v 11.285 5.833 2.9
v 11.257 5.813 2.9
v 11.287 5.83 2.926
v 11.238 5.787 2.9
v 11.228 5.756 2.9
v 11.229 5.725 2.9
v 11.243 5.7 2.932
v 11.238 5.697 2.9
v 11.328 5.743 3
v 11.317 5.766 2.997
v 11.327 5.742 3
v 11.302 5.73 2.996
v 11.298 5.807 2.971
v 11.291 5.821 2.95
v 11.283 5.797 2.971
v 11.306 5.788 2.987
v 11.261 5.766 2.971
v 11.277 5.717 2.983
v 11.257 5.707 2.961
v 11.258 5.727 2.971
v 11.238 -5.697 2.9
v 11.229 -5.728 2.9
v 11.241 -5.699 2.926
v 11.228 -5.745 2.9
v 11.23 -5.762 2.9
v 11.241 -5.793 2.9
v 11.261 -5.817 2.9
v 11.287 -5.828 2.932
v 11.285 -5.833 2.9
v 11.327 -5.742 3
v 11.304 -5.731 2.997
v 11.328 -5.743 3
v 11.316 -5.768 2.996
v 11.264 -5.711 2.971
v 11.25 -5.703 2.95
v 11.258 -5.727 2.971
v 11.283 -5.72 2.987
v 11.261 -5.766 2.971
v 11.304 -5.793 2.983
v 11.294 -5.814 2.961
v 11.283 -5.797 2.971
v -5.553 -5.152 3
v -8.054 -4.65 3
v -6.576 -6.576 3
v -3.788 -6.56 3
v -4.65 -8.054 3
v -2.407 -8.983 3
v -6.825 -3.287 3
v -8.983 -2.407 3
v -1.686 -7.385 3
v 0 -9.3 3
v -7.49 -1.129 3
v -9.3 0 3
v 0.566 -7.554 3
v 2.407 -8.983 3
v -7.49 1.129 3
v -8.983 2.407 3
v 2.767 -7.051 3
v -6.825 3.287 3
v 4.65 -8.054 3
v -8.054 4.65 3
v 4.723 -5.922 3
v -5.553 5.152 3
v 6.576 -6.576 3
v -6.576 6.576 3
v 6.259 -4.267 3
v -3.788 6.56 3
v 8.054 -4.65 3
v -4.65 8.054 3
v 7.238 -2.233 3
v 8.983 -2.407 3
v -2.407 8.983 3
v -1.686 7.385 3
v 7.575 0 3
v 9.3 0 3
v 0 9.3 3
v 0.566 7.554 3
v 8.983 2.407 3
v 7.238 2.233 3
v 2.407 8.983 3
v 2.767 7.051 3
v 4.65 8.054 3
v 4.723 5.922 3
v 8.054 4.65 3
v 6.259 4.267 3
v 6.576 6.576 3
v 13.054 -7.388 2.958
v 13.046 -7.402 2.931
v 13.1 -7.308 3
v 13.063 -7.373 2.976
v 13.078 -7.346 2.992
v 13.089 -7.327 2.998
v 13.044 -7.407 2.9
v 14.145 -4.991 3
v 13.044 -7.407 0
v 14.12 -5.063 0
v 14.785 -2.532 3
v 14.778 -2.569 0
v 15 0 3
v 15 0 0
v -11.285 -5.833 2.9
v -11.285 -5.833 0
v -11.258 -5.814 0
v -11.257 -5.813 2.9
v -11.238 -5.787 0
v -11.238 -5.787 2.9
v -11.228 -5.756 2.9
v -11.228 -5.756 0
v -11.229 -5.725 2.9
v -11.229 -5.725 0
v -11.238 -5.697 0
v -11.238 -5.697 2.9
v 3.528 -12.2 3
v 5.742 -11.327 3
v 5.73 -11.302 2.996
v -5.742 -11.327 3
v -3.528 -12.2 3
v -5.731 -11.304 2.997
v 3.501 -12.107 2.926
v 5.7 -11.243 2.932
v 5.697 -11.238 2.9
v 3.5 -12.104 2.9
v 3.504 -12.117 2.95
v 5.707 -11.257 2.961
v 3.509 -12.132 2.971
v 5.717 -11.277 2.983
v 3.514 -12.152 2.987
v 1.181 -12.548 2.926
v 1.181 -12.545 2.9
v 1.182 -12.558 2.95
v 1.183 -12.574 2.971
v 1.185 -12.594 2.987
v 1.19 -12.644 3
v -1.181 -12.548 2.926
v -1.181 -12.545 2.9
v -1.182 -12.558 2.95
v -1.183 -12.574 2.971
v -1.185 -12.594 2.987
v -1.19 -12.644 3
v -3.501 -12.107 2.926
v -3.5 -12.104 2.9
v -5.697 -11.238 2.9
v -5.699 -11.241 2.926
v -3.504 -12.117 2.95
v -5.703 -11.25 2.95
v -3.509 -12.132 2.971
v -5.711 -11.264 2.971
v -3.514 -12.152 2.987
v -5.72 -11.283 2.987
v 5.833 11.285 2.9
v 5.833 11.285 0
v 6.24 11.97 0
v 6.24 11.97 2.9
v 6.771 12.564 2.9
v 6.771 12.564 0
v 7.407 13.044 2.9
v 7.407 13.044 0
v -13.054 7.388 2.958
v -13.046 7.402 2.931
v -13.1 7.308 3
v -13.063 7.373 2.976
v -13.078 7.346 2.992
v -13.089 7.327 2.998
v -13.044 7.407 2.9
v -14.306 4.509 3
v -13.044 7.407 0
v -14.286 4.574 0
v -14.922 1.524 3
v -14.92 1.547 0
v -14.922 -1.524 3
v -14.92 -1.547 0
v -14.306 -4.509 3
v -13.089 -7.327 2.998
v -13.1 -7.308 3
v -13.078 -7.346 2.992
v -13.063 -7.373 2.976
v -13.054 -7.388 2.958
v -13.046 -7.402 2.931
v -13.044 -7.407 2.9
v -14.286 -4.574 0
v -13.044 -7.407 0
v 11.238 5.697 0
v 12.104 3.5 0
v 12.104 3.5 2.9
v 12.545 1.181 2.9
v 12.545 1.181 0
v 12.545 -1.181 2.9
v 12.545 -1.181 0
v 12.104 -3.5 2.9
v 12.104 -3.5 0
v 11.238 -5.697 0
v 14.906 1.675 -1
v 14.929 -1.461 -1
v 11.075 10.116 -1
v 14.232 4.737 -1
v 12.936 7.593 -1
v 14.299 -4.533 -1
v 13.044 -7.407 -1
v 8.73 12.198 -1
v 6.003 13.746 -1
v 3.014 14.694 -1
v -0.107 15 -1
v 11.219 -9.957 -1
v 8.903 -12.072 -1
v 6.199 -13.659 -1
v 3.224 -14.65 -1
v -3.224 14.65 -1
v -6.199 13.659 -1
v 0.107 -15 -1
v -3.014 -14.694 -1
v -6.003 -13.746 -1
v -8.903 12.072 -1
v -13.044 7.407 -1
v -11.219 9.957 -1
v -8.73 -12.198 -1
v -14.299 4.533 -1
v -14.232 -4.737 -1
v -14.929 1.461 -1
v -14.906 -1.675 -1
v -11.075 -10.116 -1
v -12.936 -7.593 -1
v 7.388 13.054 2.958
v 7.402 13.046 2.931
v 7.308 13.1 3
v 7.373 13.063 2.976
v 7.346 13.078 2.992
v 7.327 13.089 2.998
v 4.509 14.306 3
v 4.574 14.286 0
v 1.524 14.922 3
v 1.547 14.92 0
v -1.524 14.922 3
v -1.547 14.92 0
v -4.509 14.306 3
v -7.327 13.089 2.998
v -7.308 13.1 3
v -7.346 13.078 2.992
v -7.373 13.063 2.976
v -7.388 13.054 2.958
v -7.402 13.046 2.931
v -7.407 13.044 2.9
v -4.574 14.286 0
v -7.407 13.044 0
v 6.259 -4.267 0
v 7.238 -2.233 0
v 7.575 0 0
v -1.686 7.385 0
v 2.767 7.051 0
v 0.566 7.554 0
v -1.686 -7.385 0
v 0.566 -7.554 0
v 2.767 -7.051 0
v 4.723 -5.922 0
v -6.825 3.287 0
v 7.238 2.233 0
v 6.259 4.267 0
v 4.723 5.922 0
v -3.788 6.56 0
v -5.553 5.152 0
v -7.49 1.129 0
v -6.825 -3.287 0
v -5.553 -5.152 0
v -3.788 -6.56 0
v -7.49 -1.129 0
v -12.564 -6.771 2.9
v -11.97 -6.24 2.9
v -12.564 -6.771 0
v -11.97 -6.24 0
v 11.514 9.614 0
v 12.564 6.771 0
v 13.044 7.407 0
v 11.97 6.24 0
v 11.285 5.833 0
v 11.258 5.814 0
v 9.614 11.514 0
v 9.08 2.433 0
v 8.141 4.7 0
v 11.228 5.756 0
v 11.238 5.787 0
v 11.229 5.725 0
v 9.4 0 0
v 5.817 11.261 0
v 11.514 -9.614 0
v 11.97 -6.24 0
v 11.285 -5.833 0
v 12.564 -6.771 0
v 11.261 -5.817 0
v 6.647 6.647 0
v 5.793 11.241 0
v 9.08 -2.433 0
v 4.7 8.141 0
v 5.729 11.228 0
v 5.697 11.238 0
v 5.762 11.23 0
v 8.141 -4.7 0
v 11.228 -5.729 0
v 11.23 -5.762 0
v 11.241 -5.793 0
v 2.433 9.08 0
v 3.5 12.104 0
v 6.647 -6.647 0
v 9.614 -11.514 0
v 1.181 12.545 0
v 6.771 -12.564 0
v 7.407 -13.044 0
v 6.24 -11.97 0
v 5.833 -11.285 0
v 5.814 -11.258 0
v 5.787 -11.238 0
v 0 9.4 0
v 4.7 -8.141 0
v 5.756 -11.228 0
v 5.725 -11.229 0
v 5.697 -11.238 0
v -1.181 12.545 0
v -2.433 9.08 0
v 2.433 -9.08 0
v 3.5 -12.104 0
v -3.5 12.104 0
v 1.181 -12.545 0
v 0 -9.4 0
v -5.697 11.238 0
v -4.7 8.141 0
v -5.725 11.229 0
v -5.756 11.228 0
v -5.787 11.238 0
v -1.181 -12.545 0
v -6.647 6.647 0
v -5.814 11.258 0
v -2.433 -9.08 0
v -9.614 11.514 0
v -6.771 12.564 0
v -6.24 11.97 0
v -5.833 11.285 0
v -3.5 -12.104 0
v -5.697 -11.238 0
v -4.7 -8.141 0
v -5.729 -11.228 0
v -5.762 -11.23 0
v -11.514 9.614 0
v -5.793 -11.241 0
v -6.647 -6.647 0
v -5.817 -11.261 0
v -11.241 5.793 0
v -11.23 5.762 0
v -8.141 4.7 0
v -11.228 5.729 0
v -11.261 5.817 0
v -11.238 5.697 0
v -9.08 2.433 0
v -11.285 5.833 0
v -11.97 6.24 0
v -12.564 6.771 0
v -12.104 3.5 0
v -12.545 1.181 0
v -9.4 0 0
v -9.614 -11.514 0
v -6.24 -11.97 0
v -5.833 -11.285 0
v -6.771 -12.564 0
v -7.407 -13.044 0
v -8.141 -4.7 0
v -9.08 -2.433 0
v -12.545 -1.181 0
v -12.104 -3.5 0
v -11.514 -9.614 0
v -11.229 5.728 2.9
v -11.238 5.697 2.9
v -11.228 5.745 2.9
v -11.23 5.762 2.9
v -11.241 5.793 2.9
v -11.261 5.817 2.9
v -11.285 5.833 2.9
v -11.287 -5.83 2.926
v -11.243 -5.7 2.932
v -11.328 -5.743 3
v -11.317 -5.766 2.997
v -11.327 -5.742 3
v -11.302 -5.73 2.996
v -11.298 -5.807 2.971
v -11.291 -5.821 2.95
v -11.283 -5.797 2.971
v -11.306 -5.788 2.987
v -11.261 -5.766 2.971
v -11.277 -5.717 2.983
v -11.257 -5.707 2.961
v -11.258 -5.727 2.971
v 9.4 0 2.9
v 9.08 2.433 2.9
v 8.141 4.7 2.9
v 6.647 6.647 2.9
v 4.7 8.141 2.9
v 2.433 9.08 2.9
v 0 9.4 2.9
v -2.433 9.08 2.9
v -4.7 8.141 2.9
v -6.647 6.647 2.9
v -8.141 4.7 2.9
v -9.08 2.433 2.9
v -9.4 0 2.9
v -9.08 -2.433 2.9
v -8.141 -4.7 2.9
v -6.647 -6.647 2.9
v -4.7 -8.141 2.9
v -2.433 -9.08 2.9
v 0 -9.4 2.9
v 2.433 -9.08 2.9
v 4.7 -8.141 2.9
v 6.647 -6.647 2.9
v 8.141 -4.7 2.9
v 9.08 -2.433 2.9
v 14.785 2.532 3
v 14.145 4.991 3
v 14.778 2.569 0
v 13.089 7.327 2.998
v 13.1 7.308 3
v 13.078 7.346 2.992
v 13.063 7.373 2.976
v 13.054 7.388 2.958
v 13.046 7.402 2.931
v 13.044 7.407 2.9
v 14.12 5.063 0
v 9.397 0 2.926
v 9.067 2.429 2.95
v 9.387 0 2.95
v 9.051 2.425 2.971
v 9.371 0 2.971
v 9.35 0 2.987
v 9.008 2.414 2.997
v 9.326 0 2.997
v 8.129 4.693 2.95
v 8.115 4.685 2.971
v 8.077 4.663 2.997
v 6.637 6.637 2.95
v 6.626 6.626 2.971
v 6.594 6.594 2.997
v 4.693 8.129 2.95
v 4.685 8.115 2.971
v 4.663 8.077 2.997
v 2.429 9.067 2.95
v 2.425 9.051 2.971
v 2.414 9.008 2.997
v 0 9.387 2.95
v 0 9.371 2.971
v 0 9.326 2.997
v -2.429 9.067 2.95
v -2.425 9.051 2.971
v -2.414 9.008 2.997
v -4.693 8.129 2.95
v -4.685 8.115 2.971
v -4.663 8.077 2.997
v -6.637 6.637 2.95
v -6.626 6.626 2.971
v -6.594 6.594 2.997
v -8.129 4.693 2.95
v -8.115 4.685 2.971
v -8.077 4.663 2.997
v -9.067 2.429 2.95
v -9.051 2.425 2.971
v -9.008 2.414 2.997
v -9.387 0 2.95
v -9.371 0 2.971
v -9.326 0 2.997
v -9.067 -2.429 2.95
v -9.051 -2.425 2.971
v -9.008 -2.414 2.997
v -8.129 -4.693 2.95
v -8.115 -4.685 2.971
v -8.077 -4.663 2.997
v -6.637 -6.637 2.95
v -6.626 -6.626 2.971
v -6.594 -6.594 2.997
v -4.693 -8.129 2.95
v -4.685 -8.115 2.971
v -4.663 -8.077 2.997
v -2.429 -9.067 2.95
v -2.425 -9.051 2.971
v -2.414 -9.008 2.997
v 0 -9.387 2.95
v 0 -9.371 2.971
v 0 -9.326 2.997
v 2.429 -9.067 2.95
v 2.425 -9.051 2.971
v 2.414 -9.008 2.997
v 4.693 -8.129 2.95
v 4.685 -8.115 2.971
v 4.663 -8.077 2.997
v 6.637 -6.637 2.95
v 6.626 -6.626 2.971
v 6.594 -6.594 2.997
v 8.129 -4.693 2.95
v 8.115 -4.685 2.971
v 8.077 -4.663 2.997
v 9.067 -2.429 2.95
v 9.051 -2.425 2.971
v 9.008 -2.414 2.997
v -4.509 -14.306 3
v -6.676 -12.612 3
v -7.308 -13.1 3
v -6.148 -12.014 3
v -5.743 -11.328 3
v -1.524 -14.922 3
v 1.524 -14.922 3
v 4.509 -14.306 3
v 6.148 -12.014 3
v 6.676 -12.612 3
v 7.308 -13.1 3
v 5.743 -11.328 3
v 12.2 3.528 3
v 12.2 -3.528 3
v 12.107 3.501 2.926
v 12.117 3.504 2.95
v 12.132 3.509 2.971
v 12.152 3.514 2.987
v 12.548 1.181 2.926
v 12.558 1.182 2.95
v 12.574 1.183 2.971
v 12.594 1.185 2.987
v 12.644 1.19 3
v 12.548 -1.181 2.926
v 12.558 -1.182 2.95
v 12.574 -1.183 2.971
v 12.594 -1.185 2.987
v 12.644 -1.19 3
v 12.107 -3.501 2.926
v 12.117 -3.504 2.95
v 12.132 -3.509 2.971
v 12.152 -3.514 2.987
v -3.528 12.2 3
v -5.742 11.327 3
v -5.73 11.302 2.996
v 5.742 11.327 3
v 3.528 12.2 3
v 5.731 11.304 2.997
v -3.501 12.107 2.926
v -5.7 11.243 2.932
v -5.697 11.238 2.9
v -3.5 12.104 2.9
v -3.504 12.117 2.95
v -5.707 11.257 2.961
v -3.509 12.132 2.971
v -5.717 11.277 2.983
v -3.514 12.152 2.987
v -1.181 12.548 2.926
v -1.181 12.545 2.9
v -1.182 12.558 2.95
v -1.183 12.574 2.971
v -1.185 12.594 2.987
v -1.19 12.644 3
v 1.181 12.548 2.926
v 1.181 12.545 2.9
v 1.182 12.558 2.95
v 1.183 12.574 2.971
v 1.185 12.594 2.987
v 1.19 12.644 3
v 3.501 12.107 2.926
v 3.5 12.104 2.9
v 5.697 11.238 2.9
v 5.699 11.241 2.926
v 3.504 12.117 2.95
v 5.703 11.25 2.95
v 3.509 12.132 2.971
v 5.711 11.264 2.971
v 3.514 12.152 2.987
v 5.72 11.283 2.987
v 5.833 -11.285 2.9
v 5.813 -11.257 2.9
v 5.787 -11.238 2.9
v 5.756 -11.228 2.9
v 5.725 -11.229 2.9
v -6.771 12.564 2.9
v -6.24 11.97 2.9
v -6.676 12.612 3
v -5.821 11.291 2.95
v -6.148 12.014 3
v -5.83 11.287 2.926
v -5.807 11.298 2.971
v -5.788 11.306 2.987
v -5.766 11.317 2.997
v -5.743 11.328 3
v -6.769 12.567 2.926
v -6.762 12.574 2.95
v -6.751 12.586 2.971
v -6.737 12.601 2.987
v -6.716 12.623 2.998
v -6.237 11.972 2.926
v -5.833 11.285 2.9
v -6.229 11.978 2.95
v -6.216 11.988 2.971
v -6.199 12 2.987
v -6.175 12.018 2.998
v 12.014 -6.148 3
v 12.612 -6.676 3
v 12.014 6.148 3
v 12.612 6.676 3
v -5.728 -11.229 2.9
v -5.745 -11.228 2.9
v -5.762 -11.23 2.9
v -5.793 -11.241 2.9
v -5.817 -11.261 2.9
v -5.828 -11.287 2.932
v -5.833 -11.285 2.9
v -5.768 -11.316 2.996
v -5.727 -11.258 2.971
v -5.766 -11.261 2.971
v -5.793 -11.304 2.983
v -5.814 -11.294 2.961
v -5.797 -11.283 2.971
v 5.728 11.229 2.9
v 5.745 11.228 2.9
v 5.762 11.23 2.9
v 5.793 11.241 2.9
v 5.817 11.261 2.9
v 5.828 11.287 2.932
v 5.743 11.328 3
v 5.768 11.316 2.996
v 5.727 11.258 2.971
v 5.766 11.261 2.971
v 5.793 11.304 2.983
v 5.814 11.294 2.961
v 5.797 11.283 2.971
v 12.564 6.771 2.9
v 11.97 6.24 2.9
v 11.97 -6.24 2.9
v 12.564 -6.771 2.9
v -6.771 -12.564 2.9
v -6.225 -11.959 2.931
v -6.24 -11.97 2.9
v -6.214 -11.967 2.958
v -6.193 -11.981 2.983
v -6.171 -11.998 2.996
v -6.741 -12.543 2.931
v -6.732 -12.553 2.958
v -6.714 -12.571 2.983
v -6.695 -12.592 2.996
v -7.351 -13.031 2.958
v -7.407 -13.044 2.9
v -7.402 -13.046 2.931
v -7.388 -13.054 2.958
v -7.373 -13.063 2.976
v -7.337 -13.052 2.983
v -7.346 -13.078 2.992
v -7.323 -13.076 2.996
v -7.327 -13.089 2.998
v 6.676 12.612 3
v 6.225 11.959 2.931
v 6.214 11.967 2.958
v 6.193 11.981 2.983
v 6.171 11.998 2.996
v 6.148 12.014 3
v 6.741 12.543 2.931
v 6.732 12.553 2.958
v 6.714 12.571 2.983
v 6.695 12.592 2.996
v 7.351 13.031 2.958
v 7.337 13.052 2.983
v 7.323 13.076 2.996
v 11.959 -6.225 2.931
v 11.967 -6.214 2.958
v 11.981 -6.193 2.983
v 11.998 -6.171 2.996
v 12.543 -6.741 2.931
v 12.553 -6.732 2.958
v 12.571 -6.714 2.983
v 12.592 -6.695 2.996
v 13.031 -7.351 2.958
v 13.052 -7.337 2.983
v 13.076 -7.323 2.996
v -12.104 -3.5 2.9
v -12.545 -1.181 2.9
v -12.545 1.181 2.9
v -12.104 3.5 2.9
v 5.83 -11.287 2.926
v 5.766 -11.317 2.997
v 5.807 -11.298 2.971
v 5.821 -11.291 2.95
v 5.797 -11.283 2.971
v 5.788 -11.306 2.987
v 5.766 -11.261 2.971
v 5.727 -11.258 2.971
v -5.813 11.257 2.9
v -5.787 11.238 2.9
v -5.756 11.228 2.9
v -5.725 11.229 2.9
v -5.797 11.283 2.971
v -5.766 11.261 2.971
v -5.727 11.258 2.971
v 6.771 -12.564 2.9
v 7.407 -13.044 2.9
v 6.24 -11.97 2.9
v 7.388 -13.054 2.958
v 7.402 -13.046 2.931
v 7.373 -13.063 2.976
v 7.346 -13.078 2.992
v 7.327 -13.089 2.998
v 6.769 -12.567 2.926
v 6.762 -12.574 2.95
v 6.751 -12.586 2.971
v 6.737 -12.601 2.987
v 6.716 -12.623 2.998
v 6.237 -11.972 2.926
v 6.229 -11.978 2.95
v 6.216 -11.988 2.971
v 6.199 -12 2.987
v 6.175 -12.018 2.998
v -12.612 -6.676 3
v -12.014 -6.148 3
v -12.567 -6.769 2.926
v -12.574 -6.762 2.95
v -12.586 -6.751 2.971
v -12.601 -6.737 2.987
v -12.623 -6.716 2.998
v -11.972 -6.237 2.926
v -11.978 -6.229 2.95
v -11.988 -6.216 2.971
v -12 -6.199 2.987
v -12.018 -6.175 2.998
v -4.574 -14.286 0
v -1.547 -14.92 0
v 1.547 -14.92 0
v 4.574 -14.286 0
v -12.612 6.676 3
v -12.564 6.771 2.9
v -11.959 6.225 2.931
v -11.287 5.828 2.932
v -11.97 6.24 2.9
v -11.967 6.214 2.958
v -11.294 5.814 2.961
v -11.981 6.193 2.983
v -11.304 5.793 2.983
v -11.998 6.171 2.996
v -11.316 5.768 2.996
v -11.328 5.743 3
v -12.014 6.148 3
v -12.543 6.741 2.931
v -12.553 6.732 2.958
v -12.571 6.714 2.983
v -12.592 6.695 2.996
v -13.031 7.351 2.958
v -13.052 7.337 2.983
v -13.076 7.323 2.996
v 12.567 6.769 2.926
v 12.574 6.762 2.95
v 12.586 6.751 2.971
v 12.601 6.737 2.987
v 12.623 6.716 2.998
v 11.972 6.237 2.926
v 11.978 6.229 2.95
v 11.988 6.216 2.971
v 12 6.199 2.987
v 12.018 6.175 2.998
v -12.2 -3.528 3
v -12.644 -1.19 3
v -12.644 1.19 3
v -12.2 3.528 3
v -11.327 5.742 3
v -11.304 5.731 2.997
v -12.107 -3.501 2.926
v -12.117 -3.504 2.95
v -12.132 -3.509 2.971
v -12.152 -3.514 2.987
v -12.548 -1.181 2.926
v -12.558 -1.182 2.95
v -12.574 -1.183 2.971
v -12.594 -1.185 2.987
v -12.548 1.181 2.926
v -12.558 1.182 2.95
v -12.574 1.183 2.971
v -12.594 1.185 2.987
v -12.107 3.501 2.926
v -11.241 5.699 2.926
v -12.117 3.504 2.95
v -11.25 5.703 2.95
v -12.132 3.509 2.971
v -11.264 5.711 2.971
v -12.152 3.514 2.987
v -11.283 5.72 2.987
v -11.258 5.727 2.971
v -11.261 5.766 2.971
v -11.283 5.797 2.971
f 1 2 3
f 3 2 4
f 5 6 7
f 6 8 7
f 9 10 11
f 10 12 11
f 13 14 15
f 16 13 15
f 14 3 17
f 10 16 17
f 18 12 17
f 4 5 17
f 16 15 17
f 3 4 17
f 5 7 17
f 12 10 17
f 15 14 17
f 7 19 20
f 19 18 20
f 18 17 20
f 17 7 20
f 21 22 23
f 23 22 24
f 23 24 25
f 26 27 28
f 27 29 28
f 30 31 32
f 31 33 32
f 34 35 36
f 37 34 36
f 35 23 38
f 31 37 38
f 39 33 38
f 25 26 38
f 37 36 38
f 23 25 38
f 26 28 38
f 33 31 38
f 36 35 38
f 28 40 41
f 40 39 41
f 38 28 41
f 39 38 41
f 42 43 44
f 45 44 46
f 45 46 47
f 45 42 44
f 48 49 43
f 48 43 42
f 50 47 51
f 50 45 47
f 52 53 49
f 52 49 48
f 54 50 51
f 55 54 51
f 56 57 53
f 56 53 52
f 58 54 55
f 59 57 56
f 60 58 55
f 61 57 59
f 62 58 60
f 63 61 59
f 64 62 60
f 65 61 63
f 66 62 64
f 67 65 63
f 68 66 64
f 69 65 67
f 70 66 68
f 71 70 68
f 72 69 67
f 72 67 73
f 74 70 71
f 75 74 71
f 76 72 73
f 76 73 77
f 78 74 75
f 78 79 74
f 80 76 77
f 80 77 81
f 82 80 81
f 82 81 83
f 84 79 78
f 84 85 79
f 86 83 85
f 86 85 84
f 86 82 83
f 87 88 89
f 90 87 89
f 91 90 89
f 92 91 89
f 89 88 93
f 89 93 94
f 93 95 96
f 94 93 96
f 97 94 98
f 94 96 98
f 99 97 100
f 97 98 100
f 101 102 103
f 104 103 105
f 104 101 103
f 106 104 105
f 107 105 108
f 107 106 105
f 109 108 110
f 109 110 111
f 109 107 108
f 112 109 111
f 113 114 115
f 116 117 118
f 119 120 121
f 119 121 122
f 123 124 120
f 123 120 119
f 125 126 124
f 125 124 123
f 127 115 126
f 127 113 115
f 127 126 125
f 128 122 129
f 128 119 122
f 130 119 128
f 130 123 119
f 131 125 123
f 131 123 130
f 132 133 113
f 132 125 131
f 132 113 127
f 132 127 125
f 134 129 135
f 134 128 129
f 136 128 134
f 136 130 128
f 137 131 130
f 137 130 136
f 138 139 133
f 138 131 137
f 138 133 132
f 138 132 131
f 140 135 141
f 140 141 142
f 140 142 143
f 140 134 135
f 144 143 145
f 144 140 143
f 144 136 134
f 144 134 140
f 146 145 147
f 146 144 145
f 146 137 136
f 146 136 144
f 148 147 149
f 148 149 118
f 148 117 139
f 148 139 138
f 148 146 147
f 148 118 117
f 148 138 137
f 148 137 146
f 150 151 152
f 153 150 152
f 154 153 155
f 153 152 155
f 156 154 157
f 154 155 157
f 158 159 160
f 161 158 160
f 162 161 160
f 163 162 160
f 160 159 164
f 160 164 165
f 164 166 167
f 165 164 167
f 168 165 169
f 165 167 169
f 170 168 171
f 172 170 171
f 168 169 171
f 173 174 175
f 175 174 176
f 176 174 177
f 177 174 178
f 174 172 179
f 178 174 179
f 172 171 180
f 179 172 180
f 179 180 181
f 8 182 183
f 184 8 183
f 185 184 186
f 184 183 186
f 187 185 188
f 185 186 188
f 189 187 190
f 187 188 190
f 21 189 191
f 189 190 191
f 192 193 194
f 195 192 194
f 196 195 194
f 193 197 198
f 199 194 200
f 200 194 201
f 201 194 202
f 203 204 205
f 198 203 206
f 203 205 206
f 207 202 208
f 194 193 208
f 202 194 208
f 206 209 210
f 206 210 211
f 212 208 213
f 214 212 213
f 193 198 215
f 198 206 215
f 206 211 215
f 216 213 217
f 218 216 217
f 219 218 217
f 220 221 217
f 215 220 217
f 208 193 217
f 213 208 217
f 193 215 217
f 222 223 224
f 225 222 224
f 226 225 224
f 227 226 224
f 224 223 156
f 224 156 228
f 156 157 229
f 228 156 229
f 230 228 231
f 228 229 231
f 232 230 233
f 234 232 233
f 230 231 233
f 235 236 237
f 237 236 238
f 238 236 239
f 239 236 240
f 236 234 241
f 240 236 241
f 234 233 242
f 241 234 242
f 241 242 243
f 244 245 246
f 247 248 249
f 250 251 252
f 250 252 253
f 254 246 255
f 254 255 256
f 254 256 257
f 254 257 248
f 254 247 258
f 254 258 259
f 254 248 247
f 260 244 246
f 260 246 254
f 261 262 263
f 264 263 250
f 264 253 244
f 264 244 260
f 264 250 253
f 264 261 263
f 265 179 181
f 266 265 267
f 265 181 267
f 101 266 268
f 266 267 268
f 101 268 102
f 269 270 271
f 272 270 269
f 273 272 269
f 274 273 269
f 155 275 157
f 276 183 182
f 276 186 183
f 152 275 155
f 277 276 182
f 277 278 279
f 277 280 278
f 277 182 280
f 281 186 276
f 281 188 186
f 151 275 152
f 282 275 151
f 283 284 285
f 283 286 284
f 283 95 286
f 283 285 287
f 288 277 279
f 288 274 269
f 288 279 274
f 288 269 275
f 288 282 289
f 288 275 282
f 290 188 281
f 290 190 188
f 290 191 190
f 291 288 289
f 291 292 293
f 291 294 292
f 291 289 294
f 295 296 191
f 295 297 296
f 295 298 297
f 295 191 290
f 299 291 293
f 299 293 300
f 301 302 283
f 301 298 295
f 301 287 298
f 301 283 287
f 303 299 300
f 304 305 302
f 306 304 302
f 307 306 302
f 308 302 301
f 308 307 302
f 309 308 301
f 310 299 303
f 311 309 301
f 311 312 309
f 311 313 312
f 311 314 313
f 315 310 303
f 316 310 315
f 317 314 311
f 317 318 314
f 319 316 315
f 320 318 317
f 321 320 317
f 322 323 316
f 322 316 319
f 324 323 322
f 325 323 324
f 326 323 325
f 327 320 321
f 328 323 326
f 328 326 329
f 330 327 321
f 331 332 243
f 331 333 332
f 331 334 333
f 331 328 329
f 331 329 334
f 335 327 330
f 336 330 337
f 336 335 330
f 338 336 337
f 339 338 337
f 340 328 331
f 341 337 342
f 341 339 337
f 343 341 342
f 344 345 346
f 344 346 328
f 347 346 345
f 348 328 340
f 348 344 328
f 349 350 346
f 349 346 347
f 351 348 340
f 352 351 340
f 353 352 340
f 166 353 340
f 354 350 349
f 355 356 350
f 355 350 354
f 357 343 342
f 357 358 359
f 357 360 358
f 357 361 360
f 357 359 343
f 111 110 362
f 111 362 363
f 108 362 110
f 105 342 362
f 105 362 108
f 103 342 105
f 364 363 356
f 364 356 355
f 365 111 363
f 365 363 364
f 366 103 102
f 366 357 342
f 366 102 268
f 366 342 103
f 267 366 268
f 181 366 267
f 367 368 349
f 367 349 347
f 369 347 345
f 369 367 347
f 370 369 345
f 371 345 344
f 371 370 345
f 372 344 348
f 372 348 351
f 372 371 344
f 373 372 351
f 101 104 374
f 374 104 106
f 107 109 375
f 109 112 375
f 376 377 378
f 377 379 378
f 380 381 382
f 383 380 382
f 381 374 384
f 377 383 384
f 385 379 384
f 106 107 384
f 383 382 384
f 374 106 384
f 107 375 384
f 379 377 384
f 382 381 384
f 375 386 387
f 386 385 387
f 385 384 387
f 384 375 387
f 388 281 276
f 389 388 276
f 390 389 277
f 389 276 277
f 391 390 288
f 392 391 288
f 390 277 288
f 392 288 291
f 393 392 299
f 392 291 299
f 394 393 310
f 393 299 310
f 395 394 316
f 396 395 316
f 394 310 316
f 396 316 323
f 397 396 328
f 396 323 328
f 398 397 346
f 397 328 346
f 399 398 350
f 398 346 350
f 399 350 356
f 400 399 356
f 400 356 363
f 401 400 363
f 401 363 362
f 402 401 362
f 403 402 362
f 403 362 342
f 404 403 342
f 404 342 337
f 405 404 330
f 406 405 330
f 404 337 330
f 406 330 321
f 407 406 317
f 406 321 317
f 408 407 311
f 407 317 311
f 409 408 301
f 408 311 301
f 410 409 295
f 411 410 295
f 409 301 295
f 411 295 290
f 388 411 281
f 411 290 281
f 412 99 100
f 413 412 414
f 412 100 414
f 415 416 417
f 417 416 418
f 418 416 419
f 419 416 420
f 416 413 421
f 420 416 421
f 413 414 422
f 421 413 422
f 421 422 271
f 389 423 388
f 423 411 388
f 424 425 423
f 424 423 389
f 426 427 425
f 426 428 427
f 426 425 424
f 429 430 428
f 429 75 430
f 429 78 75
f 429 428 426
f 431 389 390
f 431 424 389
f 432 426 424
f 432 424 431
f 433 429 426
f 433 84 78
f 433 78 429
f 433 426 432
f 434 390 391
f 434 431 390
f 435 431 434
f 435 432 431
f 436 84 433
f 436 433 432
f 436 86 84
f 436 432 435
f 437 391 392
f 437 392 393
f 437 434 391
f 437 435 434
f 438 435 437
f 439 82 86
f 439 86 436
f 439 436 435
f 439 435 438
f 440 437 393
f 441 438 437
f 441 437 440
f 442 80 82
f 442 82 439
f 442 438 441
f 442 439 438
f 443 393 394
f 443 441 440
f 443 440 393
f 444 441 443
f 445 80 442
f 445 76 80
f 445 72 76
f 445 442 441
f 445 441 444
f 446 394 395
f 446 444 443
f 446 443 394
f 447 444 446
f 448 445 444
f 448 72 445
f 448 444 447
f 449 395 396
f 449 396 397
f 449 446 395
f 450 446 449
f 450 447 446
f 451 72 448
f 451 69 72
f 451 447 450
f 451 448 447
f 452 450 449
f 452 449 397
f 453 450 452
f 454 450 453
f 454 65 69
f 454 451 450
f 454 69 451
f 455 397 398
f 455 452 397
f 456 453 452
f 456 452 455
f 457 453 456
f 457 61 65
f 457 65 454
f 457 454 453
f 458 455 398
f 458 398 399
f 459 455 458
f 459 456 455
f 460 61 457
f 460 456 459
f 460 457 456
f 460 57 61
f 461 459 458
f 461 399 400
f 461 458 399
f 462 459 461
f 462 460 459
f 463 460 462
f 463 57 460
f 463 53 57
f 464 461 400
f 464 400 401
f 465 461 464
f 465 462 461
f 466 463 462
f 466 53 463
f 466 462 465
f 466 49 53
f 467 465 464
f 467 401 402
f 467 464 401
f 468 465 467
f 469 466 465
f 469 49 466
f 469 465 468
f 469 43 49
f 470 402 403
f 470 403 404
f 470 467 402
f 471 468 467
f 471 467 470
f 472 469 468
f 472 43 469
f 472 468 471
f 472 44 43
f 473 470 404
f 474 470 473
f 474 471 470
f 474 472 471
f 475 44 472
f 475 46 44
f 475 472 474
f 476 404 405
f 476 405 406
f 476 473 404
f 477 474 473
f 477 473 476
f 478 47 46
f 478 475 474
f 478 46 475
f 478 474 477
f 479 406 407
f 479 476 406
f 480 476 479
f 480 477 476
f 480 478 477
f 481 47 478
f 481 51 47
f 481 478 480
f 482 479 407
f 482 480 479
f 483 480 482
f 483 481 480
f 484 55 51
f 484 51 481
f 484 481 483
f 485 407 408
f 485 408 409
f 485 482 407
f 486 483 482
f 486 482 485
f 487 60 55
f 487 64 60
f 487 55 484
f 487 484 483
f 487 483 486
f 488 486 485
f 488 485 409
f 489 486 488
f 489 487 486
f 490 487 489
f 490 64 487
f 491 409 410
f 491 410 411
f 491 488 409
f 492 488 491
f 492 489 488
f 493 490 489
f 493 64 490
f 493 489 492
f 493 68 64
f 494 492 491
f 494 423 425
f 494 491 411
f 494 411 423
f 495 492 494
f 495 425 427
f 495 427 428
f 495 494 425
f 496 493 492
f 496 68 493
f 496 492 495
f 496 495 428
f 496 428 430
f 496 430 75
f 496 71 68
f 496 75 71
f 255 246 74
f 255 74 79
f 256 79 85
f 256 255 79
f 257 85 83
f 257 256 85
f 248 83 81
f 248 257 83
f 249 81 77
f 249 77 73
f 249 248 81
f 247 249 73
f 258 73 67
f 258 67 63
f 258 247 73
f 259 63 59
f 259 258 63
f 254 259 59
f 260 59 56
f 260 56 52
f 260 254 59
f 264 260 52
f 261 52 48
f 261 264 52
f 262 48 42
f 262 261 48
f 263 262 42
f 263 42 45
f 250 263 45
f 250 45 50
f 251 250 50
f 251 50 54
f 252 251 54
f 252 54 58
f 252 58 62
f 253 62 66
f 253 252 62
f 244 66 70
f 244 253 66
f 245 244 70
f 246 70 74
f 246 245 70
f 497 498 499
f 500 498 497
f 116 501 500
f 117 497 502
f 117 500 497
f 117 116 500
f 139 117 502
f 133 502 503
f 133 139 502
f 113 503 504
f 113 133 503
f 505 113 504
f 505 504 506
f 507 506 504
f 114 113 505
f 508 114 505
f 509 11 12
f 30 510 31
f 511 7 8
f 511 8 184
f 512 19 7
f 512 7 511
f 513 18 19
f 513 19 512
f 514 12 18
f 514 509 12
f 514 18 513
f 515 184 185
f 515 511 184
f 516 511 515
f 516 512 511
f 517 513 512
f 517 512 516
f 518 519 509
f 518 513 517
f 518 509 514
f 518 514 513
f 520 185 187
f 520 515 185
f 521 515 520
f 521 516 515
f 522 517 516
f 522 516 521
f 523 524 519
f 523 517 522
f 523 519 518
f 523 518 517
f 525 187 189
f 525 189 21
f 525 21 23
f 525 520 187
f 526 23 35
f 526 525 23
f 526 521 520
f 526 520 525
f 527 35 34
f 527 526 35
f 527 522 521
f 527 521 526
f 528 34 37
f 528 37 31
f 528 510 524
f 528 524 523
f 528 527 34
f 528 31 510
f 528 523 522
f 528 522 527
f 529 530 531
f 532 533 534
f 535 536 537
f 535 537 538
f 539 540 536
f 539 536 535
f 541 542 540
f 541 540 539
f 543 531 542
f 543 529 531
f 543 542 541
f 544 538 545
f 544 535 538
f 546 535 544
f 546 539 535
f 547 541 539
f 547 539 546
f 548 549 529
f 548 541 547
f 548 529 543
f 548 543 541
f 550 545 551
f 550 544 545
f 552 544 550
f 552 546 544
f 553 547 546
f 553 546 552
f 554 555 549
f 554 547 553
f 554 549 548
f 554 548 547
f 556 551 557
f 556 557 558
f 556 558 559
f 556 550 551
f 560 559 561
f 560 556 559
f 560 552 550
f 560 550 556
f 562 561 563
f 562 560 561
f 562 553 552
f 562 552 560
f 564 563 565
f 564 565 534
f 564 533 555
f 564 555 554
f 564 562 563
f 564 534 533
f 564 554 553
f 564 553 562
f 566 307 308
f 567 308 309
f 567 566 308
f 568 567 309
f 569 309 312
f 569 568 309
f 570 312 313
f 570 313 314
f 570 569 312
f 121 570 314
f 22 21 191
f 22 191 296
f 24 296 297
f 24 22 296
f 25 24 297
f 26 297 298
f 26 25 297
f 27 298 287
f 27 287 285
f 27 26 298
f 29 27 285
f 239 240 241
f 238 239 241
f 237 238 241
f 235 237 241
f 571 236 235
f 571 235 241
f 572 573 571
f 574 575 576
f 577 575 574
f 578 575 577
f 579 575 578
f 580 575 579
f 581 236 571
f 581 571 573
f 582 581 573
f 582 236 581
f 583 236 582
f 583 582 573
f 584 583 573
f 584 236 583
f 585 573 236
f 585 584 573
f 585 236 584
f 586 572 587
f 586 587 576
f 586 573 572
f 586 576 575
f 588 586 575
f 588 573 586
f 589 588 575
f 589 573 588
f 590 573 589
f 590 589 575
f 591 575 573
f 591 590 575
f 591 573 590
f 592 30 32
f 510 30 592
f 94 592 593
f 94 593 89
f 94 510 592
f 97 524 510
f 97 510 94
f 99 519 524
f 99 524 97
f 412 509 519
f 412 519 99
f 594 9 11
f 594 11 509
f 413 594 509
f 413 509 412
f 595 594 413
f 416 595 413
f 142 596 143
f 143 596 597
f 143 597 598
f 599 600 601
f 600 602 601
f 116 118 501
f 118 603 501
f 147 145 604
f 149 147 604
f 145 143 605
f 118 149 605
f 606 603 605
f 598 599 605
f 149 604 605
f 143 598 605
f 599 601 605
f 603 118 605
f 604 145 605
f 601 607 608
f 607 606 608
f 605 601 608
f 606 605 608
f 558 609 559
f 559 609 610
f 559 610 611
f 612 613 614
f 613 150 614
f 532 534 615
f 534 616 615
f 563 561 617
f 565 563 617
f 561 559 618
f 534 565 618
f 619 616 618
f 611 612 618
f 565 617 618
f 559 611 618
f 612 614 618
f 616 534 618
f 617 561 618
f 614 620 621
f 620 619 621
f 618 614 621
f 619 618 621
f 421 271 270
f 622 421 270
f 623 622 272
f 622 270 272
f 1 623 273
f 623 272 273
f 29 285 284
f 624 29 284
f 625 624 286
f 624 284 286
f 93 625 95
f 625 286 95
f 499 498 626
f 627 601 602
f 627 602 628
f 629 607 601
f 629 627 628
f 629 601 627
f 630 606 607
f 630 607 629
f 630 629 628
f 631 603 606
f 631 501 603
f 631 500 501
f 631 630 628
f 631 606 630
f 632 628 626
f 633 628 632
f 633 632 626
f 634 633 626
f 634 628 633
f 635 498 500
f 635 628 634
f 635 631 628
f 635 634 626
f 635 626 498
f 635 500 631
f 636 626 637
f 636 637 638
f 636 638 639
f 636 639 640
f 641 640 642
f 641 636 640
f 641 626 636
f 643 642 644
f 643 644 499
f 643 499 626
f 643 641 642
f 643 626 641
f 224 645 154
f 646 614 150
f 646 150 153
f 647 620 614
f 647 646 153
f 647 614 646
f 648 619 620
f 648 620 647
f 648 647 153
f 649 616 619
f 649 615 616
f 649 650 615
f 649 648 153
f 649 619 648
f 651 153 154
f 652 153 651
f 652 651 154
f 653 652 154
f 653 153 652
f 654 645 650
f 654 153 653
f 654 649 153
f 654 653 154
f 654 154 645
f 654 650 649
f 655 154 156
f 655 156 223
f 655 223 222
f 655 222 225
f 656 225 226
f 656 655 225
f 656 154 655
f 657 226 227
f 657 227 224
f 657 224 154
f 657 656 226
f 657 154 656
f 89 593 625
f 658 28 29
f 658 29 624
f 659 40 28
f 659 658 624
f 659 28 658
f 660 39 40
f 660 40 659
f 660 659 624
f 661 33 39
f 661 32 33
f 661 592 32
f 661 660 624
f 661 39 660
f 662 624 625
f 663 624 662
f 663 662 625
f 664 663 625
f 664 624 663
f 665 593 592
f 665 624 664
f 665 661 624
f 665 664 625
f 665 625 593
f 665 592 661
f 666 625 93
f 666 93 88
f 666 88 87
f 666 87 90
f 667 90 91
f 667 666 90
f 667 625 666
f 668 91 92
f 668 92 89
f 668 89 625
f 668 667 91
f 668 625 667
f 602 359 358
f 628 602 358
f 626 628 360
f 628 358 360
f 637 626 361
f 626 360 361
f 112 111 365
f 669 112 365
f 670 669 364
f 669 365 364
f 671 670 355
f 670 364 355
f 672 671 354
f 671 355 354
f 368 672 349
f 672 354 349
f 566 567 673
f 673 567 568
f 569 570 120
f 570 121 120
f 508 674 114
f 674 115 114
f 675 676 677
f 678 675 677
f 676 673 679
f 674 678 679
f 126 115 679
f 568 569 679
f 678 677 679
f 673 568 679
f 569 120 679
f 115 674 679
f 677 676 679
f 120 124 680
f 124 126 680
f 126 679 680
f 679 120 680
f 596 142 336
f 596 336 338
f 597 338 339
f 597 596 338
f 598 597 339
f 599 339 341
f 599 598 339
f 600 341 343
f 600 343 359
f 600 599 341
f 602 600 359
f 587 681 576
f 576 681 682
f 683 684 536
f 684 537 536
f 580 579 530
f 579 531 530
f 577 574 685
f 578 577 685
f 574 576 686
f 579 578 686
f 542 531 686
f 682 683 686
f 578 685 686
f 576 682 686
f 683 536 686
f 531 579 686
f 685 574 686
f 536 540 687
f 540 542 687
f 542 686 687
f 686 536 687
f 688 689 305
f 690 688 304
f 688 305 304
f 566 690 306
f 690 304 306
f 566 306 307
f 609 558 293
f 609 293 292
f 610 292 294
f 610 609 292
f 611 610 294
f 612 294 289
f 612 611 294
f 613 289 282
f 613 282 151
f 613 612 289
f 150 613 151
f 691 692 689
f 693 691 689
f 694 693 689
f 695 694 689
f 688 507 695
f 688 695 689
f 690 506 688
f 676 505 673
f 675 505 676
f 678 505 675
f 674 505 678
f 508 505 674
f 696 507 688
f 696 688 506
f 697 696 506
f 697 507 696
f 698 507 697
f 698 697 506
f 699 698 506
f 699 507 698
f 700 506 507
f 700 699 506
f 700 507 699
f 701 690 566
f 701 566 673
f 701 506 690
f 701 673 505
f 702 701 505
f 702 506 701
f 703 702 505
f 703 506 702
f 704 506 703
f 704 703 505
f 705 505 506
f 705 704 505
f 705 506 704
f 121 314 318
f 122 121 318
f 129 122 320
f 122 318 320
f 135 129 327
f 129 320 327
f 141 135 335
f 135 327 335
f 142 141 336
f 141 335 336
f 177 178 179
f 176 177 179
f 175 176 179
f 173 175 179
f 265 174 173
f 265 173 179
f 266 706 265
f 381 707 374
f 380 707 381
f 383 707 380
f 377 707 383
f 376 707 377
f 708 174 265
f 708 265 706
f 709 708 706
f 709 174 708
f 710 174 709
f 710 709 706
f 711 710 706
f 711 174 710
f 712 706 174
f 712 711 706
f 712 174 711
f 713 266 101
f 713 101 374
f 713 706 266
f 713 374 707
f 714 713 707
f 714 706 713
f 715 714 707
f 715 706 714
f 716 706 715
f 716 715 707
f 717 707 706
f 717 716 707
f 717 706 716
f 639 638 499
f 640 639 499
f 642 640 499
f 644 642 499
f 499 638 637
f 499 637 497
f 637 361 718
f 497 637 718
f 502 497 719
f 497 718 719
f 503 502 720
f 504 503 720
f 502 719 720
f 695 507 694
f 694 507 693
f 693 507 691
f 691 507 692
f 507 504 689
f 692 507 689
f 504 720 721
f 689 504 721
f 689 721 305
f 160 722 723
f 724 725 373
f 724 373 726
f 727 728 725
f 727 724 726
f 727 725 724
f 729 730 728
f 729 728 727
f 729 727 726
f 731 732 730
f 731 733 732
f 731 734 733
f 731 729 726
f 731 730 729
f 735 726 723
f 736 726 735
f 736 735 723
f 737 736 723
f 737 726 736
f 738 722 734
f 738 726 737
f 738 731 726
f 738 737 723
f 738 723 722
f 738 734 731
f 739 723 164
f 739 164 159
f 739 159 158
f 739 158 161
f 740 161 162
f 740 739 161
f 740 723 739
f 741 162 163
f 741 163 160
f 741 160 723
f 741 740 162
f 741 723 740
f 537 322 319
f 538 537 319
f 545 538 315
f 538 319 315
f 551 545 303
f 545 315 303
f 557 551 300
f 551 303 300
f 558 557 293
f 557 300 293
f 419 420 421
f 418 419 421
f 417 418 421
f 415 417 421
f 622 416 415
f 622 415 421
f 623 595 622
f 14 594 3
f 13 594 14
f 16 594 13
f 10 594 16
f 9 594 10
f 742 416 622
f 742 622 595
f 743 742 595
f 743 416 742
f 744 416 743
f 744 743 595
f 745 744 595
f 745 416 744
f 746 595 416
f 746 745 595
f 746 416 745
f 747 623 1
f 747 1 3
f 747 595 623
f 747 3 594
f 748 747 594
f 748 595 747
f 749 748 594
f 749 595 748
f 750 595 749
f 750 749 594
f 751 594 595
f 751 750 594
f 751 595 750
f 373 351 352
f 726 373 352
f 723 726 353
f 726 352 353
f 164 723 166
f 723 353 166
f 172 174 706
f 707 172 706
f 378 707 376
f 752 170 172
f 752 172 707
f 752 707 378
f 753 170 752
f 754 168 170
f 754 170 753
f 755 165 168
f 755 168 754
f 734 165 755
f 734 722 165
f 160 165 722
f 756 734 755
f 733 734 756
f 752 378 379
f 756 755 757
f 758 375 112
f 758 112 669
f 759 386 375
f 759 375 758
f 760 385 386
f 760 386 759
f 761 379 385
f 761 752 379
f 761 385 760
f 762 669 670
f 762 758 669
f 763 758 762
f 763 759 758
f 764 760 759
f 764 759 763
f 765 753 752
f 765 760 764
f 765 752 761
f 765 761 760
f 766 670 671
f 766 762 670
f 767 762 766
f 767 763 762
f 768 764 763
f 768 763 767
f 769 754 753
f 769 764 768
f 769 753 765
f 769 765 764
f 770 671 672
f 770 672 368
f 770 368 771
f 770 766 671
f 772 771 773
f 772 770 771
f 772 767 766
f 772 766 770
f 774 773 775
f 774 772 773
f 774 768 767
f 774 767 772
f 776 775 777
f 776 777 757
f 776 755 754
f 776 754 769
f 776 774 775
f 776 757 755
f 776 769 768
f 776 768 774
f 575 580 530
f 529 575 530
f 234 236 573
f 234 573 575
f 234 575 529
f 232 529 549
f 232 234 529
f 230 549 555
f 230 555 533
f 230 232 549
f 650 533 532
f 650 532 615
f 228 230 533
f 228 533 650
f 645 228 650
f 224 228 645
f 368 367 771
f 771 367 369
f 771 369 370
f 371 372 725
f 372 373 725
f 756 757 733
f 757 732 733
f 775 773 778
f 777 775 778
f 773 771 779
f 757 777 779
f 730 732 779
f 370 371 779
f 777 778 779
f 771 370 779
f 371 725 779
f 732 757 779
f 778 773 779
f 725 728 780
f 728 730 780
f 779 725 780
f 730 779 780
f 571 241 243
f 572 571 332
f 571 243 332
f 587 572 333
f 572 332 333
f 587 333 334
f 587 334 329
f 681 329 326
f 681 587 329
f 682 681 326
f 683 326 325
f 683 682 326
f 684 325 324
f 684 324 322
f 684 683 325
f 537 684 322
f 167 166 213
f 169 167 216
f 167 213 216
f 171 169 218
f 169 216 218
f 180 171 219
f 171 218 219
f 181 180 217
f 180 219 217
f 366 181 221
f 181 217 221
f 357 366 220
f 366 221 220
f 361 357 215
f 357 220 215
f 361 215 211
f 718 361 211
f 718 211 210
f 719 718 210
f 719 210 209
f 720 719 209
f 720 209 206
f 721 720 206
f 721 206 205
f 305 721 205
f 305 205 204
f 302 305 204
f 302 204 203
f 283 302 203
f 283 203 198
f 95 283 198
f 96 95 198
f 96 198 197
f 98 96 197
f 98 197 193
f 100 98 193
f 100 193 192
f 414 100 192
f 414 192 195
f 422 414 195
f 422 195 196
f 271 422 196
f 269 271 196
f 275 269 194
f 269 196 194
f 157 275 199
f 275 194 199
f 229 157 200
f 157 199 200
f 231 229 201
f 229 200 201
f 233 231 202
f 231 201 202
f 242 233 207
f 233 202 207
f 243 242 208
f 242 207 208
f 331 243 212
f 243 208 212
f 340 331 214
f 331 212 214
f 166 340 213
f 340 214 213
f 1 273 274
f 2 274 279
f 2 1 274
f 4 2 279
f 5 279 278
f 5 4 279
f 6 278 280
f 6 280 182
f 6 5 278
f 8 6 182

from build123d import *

# Parameters (mm, degrees)
BOSS_EXTRUDE1_DEPTH   = 3
BOSS_EXTRUDE1_2_DEPTH = 3
BOSS_EXTRUDE1_3_DEPTH = 3
BOSS_EXTRUDE1_4_DEPTH = 3
SKETCH1_R             = 9.4
SKETCH1_R_2           = 7.575
BOSS_EXTRUDE1_5_DEPTH = 3
BOSS_EXTRUDE2_START   = -1
SKETCH2_R             = 15
BOSS_EXTRUDE2_DEPTH   = 1
FILLET1_R             = 0.1
FILLET2_R             = 0.1


with BuildPart() as part:
    # Sketch1 → Boss-Extrude1 (new body)
    with BuildSketch(Plane.XY):
        with BuildLine():
            ThreePointArc((5.790318529, 11.190719876), (6.456402483, 12.241261263), (7.406868315, 13.043707363))
            ThreePointArc((7.406868315, 13.043707363), (0, 15), (-7.406868315, 13.043707363))
            ThreePointArc((-7.406868315, 13.043707363), (-6.456402483, 12.241261263), (-5.790318529, 11.190719876))
            ThreePointArc((-5.790318529, 11.190719876), (0, 12.6), (5.790318529, 11.190719876))
        make_face()
    extrude(amount=BOSS_EXTRUDE1_DEPTH)



with BuildPart() as body_2:
    # Sketch1 → Boss-Extrude1 2 (new body)
    with BuildSketch(Plane.XY):
        with BuildLine():
            ThreePointArc((13.043707363, -7.406868315), (14.502682691, -3.830430103), (15, 0))
            ThreePointArc((15, 0), (14.502682691, 3.830430103), (13.043707363, 7.406868315))
            ThreePointArc((13.043707363, 7.406868315), (12.241261263, 6.456402483), (11.190719876, 5.790318529))
            ThreePointArc((11.190719876, 5.790318529), (12.6, 0), (11.190719876, -5.790318529))
            ThreePointArc((11.190719876, -5.790318529), (12.241261263, -6.456402483), (13.043707363, -7.406868315))
        make_face()
    extrude(amount=BOSS_EXTRUDE1_2_DEPTH)


with BuildPart() as body_3:
    # Sketch1 → Boss-Extrude1 3 (new body)
    with BuildSketch(Plane.XY):
        with BuildLine():
            ThreePointArc((-7.406868315, -13.043707363), (0, -15), (7.406868315, -13.043707363))
            ThreePointArc((7.406868315, -13.043707363), (6.456402483, -12.241261263), (5.790318529, -11.190719876))
            ThreePointArc((5.790318529, -11.190719876), (0, -12.6), (-5.790318529, -11.190719876))
            ThreePointArc((-5.790318529, -11.190719876), (-6.456402483, -12.241261263), (-7.406868315, -13.043707363))
        make_face()
    extrude(amount=BOSS_EXTRUDE1_3_DEPTH)


with BuildPart() as body_4:
    # Sketch1 → Boss-Extrude1 4 (new body)
    with BuildSketch(Plane.XY):
        with BuildLine():
            ThreePointArc((-11.190719876, 5.790318529), (-12.241261263, 6.456402483), (-13.043707363, 7.406868315))
            ThreePointArc((-13.043707363, 7.406868315), (-15, 0), (-13.043707363, -7.406868315))
            ThreePointArc((-13.043707363, -7.406868315), (-12.241261263, -6.456402483), (-11.190719876, -5.790318529))
            ThreePointArc((-11.190719876, -5.790318529), (-12.6, 0), (-11.190719876, 5.790318529))
        make_face()
    extrude(amount=BOSS_EXTRUDE1_4_DEPTH)


with BuildPart() as body_5:
    # Sketch1 → Boss-Extrude1 5 (new body)
    with BuildSketch(Plane.XY):
        Circle(SKETCH1_R)
        Circle(SKETCH1_R_2, mode=Mode.SUBTRACT)
    extrude(amount=BOSS_EXTRUDE1_5_DEPTH)


with BuildPart() as part_1:
    add(part.part)

    add(body_2.part)  # Boss-Extrude2 merges body 2

    add(body_3.part)  # Boss-Extrude2 merges body 3

    add(body_4.part)  # Boss-Extrude2 merges body 4

    add(body_5.part)  # Boss-Extrude2 merges body 5
    # Sketch2 → Boss-Extrude2 (add)
    with BuildSketch(Plane.XY.offset(BOSS_EXTRUDE2_START)):
        with Locations(Location((0, 0, 0), (0, 0, 150.409926376))):
            Circle(SKETCH2_R)
    extrude(amount=BOSS_EXTRUDE2_DEPTH)

    # Fillet1
    fillet1_edges = [part_1.edges().sort_by_distance(p)[0] for p in [
        (11.190719876, 5.790318529, 1.5),
        (11.190719876, -5.790318529, 1.5),
        (5.790318529, -11.190719876, 1.5),
        (-5.790318529, -11.190719876, 1.5),
        (-11.190719876, -5.790318529, 1.5),
        (-11.190719876, 5.790318529, 1.5),
        (5.790318529, 11.190719876, 1.5),
        (-5.790318529, 11.190719876, 1.5),
    ]]
    fillet(fillet1_edges, radius=FILLET1_R)

    # Fillet2
    fillet2_edges = [part_1.edges().sort_by_distance(p)[0] for p in [
        (6.490717006, 12.280096445, 3),
        (12.280096445, -6.490717006, 3),
        (-6.490717006, -12.280096445, 3),
        (-12.280096445, 6.490717006, 3),
        (-9.4, 0, 3),
        (0, -12.6, 3),
        (6.490717006, -12.280096445, 3),
        (5.775107932, -11.232998068, 3),
        (-5.775107932, -11.232998068, 3),
        (12.6, 0, 3),
        (12.280096445, 6.490717006, 3),
        (11.232998068, 5.775107932, 3),
        (11.232998068, -5.775107932, 3),
        (0, 12.6, 3),
        (-6.490717006, 12.280096445, 3),
        (-5.775107932, 11.232998068, 3),
        (5.775107932, 11.232998068, 3),
        (-12.6, 0, 3),
        (-12.280096445, -6.490717006, 3),
        (-11.232998068, -5.775107932, 3),
        (-11.232998068, 5.775107932, 3),
    ]]
    fillet(fillet2_edges, radius=FILLET2_R - 0.0001)  # a hair under: the kernel refuses the full size


solid = part_1.part
